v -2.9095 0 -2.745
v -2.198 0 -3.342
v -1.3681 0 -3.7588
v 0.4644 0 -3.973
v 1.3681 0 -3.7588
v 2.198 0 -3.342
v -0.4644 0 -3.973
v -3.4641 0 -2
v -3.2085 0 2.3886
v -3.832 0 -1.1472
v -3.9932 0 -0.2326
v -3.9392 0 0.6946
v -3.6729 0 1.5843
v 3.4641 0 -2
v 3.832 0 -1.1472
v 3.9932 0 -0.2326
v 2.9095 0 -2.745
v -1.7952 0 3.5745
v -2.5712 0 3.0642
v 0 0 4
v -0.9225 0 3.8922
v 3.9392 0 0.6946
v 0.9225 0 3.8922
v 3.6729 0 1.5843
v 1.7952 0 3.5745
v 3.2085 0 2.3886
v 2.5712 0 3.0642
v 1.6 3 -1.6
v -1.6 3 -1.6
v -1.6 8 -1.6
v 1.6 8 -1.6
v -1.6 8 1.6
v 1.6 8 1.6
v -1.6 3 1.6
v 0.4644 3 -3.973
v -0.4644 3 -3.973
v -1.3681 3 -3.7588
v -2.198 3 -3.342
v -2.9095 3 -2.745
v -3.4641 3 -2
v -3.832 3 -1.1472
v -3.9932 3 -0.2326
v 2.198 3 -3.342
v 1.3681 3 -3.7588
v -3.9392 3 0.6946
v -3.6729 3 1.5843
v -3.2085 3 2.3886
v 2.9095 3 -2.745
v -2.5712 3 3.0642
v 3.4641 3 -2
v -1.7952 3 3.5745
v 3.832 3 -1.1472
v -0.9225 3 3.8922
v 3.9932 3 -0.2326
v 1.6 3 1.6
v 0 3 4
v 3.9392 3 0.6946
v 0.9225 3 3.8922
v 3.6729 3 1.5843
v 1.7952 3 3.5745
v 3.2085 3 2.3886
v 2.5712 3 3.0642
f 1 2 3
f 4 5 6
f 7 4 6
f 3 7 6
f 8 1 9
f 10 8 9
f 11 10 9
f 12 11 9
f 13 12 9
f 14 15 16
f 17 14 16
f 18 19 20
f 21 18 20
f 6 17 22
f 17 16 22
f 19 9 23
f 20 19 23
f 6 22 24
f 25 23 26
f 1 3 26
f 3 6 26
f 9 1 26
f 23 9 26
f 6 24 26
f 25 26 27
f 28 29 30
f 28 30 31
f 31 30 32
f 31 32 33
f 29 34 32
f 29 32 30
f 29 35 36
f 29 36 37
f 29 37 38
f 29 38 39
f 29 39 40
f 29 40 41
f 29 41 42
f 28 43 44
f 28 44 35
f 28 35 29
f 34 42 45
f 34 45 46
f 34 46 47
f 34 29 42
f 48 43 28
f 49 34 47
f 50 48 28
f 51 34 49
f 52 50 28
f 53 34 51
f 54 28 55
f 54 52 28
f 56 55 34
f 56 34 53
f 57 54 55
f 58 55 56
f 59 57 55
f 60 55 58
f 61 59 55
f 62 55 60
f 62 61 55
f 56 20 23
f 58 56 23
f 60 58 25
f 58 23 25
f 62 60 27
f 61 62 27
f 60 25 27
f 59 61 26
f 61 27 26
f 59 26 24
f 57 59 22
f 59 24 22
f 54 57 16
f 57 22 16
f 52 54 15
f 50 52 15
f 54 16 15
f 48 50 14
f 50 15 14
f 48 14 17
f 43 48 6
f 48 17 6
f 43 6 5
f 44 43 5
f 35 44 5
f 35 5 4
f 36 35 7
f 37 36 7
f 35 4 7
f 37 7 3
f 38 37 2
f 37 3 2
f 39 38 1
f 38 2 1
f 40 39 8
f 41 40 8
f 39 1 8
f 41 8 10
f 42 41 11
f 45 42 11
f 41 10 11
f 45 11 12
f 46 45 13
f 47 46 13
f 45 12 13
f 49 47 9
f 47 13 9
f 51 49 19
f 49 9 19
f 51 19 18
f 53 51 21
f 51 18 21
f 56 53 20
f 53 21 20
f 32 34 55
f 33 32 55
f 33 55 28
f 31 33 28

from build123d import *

# Parameters (mm, degrees)
SKETCH_1_R      = 4
EXTRUDE_1_DEPTH = 3
SKETCH_2_W      = 3.2
SKETCH_2_H      = 3.2
EXTRUDE_3_DEPTH = 5


with BuildPart() as part:
    # Эскиз1 → Бобышка-Вытянуть1 (new body)
    with BuildSketch(Plane(origin=(0, 0, 0), x_dir=(1, 0, 0), z_dir=(0, 1, 0))):
        with Locations(Location((0, 0, 0), (0, 0, 270))):
            Circle(SKETCH_1_R)
    extrude(amount=EXTRUDE_1_DEPTH)

    # Эскиз2 → Бобышка-Вытянуть3 (add)
    with BuildSketch(Plane(origin=(0, 3, 0), x_dir=(1, 0, 0), z_dir=(0, 1, 0))):
        Rectangle(SKETCH_2_W, SKETCH_2_H)
    extrude(amount=EXTRUDE_3_DEPTH)


solid = part.part
